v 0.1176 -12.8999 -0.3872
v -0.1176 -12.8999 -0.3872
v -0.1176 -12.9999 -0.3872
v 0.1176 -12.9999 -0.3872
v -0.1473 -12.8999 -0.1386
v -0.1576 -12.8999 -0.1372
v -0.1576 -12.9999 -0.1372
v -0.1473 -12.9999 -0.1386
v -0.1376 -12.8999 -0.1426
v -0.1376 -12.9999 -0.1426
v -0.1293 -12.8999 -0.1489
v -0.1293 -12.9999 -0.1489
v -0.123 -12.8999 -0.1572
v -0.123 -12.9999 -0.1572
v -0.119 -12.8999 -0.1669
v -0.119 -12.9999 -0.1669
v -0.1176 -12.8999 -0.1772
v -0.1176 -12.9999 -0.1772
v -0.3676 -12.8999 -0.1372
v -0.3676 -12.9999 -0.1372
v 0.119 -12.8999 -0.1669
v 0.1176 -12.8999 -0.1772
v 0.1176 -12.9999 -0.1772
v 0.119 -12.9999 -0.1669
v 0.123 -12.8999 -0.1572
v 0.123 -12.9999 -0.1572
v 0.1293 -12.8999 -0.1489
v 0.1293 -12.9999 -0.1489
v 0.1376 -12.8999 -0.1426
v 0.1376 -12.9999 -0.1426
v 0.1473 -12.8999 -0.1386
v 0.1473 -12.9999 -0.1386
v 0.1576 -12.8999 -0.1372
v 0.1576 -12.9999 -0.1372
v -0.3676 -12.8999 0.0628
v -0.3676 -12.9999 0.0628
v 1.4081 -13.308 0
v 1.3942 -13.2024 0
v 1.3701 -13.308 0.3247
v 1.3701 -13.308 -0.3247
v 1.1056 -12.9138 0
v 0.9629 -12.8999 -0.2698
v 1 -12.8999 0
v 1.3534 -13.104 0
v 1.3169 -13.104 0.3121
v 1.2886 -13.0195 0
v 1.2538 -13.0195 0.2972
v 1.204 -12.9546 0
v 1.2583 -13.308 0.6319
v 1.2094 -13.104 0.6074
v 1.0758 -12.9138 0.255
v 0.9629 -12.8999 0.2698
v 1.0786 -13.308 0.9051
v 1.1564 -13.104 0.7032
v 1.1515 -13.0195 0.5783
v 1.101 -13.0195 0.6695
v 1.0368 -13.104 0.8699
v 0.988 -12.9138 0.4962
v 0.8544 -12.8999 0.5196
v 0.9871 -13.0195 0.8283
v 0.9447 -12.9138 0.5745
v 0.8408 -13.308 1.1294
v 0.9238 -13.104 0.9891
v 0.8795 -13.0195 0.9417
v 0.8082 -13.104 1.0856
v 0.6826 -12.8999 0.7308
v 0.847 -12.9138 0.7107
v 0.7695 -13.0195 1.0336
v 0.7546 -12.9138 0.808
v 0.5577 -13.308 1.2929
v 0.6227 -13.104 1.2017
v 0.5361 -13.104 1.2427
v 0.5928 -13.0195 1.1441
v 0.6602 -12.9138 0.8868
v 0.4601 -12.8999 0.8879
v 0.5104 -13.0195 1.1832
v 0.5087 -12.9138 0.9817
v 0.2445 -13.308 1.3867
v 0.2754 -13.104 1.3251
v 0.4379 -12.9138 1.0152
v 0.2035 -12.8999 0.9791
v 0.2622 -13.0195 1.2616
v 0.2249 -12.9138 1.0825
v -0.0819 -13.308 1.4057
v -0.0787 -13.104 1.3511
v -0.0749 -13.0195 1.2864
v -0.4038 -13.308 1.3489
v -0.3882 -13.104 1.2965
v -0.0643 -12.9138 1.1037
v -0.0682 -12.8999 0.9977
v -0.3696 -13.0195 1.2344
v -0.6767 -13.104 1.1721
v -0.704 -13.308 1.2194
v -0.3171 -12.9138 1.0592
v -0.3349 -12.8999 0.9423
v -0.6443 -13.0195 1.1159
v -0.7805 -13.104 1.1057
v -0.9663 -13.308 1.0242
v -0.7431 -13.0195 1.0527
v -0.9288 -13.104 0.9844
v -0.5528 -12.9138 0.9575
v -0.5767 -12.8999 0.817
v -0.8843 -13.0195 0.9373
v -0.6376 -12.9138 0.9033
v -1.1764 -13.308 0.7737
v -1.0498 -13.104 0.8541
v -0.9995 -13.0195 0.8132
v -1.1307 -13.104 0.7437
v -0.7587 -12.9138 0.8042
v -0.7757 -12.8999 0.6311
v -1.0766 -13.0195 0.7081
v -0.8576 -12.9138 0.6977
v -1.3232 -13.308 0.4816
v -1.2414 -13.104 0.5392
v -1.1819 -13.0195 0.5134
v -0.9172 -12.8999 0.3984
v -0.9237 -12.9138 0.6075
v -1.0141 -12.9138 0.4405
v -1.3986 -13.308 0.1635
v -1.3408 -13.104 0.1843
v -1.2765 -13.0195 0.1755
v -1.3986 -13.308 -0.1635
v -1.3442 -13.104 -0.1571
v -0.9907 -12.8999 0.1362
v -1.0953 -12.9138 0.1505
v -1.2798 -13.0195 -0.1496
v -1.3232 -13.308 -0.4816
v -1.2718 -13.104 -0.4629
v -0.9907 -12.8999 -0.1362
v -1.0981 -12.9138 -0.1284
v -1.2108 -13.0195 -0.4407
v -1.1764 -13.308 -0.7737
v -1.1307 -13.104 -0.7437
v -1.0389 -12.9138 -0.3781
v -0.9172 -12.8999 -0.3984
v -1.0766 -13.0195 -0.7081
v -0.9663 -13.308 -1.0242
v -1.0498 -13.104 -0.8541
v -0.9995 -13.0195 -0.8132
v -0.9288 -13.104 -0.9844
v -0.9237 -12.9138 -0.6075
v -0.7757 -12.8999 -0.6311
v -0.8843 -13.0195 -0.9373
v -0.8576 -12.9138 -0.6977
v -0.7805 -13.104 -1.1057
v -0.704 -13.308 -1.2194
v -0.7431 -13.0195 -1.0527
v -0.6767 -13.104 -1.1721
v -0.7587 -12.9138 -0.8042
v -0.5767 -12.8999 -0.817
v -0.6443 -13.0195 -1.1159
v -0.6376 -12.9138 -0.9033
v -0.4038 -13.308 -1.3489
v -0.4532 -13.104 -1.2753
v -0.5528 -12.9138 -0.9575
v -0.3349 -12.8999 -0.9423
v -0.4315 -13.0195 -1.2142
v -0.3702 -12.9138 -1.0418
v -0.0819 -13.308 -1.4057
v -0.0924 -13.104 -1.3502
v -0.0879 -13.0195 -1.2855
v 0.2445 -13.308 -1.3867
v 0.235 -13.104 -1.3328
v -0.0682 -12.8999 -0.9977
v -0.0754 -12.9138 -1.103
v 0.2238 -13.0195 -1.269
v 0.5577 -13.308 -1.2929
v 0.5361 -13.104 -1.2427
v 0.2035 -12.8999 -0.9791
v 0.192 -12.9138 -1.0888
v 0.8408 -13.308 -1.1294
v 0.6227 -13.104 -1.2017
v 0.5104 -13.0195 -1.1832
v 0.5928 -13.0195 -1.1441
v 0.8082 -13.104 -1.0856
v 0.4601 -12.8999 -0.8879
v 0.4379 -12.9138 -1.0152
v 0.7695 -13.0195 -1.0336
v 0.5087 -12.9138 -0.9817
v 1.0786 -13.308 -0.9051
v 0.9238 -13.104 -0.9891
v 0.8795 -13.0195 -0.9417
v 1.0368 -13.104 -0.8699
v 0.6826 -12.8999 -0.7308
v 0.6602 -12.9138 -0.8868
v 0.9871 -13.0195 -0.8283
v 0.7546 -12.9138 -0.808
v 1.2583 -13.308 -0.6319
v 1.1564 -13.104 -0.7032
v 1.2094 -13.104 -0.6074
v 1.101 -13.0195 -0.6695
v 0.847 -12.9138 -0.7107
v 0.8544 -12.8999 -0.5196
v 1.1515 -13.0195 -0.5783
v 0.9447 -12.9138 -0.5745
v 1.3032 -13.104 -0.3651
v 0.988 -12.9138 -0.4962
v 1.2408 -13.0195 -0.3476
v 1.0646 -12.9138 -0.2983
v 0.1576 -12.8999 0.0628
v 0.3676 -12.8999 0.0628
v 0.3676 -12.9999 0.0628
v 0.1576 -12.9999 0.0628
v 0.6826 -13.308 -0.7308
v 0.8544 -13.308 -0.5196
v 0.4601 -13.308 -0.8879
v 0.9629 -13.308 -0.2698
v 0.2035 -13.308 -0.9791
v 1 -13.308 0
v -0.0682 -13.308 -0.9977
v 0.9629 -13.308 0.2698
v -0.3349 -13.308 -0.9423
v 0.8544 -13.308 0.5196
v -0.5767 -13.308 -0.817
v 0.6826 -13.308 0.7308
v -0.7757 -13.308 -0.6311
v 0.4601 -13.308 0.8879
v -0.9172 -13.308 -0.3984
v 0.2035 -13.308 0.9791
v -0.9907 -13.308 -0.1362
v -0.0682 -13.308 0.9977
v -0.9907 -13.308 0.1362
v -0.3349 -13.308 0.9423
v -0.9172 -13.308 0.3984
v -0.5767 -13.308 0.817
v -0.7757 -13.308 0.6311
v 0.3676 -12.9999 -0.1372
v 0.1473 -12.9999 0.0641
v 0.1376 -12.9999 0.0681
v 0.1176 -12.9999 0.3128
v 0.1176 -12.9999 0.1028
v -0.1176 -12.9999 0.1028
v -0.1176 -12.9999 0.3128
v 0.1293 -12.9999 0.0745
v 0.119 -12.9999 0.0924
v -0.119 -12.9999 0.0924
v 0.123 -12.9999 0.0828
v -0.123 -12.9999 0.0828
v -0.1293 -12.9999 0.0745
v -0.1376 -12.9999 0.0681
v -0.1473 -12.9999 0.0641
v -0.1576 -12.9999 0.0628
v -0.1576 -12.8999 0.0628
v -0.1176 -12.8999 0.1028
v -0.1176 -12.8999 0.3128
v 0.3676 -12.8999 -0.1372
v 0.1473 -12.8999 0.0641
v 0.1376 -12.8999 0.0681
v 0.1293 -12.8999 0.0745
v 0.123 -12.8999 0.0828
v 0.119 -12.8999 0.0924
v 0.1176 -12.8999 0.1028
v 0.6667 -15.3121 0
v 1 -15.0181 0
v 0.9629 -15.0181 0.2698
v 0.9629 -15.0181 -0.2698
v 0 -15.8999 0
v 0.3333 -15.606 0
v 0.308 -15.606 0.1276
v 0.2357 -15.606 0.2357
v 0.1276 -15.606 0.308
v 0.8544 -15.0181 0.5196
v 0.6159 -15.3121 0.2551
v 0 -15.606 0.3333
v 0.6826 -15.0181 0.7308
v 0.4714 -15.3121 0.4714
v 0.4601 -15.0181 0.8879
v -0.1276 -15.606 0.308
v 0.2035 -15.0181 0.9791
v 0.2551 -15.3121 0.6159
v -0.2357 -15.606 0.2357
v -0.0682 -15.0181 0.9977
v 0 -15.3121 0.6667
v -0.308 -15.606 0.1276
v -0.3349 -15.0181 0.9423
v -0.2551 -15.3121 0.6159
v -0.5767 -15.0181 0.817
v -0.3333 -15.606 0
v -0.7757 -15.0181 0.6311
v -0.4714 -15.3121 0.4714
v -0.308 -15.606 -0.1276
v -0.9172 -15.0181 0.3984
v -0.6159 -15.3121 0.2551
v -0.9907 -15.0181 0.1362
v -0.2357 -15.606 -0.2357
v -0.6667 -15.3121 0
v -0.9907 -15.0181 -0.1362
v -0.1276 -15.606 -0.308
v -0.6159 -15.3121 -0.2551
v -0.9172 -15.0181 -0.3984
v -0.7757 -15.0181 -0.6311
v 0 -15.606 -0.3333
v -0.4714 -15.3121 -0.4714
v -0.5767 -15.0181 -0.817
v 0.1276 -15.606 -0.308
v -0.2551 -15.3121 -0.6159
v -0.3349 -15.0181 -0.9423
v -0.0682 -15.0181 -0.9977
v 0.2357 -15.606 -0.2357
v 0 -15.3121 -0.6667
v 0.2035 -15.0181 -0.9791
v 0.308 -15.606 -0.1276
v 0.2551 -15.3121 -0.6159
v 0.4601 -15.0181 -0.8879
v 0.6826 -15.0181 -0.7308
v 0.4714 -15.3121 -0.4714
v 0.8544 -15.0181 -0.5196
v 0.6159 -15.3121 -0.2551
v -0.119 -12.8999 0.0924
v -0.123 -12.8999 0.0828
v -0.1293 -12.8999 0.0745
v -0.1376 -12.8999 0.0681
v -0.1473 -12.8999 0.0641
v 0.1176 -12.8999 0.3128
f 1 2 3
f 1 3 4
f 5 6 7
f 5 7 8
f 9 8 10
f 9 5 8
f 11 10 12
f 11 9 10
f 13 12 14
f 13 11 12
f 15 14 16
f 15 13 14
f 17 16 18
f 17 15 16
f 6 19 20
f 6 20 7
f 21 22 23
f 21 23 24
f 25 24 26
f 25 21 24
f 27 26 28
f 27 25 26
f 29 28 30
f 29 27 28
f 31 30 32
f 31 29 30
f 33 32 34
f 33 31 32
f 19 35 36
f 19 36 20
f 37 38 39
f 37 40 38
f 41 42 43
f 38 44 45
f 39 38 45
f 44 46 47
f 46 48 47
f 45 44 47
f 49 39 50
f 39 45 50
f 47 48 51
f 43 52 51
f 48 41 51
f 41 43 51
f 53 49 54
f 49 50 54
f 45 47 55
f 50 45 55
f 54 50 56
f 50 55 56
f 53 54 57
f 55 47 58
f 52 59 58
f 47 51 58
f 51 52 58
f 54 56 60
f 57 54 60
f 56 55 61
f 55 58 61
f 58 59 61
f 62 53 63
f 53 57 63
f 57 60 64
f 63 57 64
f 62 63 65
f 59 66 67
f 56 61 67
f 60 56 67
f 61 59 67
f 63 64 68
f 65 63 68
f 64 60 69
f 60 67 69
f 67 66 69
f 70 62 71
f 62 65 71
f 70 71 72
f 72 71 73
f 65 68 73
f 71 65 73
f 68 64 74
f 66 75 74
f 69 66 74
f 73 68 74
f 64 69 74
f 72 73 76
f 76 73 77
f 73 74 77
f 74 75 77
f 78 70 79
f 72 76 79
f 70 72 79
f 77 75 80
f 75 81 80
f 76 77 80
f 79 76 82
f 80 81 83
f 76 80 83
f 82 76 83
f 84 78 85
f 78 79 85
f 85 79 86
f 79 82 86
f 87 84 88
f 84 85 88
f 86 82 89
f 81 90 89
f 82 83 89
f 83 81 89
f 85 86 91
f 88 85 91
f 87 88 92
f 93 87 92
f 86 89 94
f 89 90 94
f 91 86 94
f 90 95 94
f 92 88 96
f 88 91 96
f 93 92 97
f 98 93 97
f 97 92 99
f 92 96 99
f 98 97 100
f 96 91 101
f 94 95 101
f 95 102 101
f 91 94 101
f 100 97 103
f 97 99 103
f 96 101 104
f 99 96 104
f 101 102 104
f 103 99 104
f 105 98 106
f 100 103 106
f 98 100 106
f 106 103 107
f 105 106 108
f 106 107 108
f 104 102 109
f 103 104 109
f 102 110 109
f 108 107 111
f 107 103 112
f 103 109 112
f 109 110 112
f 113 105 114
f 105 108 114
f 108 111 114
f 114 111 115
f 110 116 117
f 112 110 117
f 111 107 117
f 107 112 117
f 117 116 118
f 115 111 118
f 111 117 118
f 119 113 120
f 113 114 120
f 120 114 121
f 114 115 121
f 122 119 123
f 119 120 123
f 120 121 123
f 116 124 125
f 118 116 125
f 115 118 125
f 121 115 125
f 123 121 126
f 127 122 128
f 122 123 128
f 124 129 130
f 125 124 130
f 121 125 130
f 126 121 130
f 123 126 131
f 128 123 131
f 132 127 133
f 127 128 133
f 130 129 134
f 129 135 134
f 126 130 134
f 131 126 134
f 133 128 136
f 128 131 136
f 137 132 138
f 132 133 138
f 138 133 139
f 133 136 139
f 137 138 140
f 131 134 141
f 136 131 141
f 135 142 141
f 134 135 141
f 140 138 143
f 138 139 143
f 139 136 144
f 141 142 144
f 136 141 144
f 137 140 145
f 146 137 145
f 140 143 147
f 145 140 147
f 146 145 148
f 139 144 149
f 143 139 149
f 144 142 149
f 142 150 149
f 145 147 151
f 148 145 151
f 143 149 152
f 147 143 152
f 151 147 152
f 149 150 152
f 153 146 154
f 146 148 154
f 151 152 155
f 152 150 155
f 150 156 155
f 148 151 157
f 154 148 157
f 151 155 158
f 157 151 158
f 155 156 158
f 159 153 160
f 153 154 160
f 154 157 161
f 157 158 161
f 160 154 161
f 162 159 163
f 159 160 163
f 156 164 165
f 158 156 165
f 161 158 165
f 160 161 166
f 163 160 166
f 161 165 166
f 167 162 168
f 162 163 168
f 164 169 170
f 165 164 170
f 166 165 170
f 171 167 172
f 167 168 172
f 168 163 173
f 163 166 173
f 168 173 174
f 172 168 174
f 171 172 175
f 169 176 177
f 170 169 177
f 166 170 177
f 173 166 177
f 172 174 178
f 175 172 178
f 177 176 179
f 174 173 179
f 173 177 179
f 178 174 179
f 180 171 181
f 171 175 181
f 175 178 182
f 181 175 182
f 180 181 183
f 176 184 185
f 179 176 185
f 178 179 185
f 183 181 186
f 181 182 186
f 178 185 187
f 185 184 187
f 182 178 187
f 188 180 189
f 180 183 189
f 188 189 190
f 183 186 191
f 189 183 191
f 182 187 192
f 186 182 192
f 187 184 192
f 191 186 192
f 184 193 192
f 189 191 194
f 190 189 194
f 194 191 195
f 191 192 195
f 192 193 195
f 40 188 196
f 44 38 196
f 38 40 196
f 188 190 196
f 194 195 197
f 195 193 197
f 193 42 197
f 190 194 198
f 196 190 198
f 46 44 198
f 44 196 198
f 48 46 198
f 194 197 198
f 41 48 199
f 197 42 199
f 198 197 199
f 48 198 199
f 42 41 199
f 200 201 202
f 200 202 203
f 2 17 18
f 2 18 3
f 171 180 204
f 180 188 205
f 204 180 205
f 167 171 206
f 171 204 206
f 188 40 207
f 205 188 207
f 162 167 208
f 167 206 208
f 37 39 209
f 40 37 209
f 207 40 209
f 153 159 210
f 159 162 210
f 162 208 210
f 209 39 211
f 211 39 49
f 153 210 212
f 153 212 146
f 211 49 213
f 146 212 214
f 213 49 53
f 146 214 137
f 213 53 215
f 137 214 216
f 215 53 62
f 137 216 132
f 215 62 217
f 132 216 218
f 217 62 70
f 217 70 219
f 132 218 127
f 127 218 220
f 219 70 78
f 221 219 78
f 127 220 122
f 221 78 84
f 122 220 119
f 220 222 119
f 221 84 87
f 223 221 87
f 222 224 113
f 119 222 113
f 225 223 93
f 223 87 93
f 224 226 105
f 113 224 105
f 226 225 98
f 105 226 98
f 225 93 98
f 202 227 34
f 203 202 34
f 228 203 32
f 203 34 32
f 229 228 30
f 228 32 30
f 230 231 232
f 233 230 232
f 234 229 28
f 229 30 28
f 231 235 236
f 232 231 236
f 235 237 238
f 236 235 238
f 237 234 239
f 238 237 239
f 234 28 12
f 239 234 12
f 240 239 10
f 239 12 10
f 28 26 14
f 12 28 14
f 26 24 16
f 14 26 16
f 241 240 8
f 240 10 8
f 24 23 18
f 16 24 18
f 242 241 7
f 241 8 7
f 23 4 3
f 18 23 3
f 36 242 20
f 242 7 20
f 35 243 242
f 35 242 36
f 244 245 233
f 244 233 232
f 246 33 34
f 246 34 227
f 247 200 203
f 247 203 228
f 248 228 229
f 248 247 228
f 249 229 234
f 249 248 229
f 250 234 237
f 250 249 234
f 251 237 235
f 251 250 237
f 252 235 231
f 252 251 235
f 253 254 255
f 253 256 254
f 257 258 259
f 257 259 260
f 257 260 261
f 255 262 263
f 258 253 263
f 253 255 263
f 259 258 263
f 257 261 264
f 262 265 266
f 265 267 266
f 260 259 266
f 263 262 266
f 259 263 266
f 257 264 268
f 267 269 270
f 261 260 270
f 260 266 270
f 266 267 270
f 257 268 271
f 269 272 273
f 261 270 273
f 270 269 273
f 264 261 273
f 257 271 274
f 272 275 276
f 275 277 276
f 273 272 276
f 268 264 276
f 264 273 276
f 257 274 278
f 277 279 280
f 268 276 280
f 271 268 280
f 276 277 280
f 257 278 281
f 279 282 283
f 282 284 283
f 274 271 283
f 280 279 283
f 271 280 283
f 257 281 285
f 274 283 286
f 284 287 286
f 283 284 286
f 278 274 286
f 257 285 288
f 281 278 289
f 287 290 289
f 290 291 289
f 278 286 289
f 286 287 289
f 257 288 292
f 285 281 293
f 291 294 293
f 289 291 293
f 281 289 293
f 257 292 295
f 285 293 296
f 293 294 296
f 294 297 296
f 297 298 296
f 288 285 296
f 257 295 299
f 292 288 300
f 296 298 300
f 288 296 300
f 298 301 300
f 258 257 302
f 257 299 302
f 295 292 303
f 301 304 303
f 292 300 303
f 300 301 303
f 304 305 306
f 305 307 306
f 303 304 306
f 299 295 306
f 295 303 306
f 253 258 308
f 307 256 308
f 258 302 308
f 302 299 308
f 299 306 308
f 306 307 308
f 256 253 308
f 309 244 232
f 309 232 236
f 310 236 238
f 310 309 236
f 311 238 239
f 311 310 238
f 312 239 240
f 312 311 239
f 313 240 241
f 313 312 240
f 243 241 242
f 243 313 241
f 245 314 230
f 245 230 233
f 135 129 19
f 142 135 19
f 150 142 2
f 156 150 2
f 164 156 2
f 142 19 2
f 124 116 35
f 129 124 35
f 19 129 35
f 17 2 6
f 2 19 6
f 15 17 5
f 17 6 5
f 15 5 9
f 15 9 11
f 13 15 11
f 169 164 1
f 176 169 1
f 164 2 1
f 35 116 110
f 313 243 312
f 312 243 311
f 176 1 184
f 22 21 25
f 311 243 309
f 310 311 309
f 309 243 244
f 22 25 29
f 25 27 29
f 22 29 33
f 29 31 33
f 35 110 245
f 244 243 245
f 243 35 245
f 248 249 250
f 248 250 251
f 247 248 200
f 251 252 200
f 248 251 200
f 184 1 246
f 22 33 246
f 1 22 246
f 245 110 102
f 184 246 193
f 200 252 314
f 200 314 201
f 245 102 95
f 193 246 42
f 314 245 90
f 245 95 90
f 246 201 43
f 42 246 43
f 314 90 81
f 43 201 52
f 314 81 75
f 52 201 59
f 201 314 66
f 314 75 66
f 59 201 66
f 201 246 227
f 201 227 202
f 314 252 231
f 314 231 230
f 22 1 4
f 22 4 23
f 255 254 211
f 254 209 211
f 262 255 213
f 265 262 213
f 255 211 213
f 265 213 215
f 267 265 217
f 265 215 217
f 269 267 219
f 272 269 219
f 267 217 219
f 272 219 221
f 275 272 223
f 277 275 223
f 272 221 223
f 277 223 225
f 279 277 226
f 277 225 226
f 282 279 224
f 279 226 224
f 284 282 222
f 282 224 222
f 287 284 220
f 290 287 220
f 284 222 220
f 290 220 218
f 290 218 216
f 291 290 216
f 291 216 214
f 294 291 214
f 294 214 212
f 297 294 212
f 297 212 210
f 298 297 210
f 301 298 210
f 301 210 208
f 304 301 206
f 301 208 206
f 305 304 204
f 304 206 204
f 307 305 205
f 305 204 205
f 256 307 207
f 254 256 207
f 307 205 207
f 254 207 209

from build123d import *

# Parameters (mm, degrees)
CUT_EXTRUDE1_DEPTH = 0.1


with BuildPart() as part:
    # Sketch1 → Revolve1 (revolve)
    with BuildSketch(Plane.XY):
        with BuildLine():
            Line((1, -15.018131929), (1, -13.308001414))
            Line((1, -13.308001414), (1.408071808, -13.308001414))
            ThreePointArc((1.408071808, -13.308001414), (1.288550343, -13.019451071), (1, -12.899929605))
            Line((1, -12.899929605), (0, -12.899929605))
            Line((0, -12.899929605), (0, -15.899929605))
            Line((0, -15.899929605), (1, -15.018131929))
        make_face()
    revolve(axis=Axis((0, -12.899929605, 0), (0, -1, 0)))

    # Sketch2 → Cut-Extrude1 (cut)
    with BuildSketch(Plane(origin=(0, -12.899929605, 0), x_dir=(1, 0, 0), z_dir=(0, 1, 0))):
        with BuildLine():
            Line((-0.117632759, 0.387224573), (0.117632759, 0.387224573))
            Line((0.117632759, 0.387224573), (0.117632759, 0.177224573))
            ThreePointArc((0.117632759, 0.177224573), (0.129348488, 0.148940302), (0.157632759, 0.137224573))
            Line((0.157632759, 0.137224573), (0.367632759, 0.137224573))
            Line((0.367632759, 0.137224573), (0.367632759, -0.062775427))
            Line((0.367632759, -0.062775427), (0.157632759, -0.062775427))
            ThreePointArc((0.157632759, -0.062775427), (0.129348488, -0.074491156), (0.117632759, -0.102775427))
            Line((0.117632759, -0.102775427), (0.117632759, -0.312775427))
            Line((0.117632759, -0.312775427), (-0.117632759, -0.312775427))
            Line((-0.117632759, -0.312775427), (-0.117632759, -0.102775427))
            ThreePointArc((-0.117632759, -0.102775427), (-0.129348488, -0.074491156), (-0.157632759, -0.062775427))
            Line((-0.157632759, -0.062775427), (-0.367632759, -0.062775427))
            Line((-0.367632759, -0.062775427), (-0.367632759, 0.137224573))
            Line((-0.367632759, 0.137224573), (-0.157632759, 0.137224573))
            ThreePointArc((-0.157632759, 0.137224573), (-0.129348488, 0.148940302), (-0.117632759, 0.177224573))
            Line((-0.117632759, 0.177224573), (-0.117632759, 0.387224573))
        make_face()
    extrude(amount=-CUT_EXTRUDE1_DEPTH, mode=Mode.SUBTRACT)


solid = part.part
